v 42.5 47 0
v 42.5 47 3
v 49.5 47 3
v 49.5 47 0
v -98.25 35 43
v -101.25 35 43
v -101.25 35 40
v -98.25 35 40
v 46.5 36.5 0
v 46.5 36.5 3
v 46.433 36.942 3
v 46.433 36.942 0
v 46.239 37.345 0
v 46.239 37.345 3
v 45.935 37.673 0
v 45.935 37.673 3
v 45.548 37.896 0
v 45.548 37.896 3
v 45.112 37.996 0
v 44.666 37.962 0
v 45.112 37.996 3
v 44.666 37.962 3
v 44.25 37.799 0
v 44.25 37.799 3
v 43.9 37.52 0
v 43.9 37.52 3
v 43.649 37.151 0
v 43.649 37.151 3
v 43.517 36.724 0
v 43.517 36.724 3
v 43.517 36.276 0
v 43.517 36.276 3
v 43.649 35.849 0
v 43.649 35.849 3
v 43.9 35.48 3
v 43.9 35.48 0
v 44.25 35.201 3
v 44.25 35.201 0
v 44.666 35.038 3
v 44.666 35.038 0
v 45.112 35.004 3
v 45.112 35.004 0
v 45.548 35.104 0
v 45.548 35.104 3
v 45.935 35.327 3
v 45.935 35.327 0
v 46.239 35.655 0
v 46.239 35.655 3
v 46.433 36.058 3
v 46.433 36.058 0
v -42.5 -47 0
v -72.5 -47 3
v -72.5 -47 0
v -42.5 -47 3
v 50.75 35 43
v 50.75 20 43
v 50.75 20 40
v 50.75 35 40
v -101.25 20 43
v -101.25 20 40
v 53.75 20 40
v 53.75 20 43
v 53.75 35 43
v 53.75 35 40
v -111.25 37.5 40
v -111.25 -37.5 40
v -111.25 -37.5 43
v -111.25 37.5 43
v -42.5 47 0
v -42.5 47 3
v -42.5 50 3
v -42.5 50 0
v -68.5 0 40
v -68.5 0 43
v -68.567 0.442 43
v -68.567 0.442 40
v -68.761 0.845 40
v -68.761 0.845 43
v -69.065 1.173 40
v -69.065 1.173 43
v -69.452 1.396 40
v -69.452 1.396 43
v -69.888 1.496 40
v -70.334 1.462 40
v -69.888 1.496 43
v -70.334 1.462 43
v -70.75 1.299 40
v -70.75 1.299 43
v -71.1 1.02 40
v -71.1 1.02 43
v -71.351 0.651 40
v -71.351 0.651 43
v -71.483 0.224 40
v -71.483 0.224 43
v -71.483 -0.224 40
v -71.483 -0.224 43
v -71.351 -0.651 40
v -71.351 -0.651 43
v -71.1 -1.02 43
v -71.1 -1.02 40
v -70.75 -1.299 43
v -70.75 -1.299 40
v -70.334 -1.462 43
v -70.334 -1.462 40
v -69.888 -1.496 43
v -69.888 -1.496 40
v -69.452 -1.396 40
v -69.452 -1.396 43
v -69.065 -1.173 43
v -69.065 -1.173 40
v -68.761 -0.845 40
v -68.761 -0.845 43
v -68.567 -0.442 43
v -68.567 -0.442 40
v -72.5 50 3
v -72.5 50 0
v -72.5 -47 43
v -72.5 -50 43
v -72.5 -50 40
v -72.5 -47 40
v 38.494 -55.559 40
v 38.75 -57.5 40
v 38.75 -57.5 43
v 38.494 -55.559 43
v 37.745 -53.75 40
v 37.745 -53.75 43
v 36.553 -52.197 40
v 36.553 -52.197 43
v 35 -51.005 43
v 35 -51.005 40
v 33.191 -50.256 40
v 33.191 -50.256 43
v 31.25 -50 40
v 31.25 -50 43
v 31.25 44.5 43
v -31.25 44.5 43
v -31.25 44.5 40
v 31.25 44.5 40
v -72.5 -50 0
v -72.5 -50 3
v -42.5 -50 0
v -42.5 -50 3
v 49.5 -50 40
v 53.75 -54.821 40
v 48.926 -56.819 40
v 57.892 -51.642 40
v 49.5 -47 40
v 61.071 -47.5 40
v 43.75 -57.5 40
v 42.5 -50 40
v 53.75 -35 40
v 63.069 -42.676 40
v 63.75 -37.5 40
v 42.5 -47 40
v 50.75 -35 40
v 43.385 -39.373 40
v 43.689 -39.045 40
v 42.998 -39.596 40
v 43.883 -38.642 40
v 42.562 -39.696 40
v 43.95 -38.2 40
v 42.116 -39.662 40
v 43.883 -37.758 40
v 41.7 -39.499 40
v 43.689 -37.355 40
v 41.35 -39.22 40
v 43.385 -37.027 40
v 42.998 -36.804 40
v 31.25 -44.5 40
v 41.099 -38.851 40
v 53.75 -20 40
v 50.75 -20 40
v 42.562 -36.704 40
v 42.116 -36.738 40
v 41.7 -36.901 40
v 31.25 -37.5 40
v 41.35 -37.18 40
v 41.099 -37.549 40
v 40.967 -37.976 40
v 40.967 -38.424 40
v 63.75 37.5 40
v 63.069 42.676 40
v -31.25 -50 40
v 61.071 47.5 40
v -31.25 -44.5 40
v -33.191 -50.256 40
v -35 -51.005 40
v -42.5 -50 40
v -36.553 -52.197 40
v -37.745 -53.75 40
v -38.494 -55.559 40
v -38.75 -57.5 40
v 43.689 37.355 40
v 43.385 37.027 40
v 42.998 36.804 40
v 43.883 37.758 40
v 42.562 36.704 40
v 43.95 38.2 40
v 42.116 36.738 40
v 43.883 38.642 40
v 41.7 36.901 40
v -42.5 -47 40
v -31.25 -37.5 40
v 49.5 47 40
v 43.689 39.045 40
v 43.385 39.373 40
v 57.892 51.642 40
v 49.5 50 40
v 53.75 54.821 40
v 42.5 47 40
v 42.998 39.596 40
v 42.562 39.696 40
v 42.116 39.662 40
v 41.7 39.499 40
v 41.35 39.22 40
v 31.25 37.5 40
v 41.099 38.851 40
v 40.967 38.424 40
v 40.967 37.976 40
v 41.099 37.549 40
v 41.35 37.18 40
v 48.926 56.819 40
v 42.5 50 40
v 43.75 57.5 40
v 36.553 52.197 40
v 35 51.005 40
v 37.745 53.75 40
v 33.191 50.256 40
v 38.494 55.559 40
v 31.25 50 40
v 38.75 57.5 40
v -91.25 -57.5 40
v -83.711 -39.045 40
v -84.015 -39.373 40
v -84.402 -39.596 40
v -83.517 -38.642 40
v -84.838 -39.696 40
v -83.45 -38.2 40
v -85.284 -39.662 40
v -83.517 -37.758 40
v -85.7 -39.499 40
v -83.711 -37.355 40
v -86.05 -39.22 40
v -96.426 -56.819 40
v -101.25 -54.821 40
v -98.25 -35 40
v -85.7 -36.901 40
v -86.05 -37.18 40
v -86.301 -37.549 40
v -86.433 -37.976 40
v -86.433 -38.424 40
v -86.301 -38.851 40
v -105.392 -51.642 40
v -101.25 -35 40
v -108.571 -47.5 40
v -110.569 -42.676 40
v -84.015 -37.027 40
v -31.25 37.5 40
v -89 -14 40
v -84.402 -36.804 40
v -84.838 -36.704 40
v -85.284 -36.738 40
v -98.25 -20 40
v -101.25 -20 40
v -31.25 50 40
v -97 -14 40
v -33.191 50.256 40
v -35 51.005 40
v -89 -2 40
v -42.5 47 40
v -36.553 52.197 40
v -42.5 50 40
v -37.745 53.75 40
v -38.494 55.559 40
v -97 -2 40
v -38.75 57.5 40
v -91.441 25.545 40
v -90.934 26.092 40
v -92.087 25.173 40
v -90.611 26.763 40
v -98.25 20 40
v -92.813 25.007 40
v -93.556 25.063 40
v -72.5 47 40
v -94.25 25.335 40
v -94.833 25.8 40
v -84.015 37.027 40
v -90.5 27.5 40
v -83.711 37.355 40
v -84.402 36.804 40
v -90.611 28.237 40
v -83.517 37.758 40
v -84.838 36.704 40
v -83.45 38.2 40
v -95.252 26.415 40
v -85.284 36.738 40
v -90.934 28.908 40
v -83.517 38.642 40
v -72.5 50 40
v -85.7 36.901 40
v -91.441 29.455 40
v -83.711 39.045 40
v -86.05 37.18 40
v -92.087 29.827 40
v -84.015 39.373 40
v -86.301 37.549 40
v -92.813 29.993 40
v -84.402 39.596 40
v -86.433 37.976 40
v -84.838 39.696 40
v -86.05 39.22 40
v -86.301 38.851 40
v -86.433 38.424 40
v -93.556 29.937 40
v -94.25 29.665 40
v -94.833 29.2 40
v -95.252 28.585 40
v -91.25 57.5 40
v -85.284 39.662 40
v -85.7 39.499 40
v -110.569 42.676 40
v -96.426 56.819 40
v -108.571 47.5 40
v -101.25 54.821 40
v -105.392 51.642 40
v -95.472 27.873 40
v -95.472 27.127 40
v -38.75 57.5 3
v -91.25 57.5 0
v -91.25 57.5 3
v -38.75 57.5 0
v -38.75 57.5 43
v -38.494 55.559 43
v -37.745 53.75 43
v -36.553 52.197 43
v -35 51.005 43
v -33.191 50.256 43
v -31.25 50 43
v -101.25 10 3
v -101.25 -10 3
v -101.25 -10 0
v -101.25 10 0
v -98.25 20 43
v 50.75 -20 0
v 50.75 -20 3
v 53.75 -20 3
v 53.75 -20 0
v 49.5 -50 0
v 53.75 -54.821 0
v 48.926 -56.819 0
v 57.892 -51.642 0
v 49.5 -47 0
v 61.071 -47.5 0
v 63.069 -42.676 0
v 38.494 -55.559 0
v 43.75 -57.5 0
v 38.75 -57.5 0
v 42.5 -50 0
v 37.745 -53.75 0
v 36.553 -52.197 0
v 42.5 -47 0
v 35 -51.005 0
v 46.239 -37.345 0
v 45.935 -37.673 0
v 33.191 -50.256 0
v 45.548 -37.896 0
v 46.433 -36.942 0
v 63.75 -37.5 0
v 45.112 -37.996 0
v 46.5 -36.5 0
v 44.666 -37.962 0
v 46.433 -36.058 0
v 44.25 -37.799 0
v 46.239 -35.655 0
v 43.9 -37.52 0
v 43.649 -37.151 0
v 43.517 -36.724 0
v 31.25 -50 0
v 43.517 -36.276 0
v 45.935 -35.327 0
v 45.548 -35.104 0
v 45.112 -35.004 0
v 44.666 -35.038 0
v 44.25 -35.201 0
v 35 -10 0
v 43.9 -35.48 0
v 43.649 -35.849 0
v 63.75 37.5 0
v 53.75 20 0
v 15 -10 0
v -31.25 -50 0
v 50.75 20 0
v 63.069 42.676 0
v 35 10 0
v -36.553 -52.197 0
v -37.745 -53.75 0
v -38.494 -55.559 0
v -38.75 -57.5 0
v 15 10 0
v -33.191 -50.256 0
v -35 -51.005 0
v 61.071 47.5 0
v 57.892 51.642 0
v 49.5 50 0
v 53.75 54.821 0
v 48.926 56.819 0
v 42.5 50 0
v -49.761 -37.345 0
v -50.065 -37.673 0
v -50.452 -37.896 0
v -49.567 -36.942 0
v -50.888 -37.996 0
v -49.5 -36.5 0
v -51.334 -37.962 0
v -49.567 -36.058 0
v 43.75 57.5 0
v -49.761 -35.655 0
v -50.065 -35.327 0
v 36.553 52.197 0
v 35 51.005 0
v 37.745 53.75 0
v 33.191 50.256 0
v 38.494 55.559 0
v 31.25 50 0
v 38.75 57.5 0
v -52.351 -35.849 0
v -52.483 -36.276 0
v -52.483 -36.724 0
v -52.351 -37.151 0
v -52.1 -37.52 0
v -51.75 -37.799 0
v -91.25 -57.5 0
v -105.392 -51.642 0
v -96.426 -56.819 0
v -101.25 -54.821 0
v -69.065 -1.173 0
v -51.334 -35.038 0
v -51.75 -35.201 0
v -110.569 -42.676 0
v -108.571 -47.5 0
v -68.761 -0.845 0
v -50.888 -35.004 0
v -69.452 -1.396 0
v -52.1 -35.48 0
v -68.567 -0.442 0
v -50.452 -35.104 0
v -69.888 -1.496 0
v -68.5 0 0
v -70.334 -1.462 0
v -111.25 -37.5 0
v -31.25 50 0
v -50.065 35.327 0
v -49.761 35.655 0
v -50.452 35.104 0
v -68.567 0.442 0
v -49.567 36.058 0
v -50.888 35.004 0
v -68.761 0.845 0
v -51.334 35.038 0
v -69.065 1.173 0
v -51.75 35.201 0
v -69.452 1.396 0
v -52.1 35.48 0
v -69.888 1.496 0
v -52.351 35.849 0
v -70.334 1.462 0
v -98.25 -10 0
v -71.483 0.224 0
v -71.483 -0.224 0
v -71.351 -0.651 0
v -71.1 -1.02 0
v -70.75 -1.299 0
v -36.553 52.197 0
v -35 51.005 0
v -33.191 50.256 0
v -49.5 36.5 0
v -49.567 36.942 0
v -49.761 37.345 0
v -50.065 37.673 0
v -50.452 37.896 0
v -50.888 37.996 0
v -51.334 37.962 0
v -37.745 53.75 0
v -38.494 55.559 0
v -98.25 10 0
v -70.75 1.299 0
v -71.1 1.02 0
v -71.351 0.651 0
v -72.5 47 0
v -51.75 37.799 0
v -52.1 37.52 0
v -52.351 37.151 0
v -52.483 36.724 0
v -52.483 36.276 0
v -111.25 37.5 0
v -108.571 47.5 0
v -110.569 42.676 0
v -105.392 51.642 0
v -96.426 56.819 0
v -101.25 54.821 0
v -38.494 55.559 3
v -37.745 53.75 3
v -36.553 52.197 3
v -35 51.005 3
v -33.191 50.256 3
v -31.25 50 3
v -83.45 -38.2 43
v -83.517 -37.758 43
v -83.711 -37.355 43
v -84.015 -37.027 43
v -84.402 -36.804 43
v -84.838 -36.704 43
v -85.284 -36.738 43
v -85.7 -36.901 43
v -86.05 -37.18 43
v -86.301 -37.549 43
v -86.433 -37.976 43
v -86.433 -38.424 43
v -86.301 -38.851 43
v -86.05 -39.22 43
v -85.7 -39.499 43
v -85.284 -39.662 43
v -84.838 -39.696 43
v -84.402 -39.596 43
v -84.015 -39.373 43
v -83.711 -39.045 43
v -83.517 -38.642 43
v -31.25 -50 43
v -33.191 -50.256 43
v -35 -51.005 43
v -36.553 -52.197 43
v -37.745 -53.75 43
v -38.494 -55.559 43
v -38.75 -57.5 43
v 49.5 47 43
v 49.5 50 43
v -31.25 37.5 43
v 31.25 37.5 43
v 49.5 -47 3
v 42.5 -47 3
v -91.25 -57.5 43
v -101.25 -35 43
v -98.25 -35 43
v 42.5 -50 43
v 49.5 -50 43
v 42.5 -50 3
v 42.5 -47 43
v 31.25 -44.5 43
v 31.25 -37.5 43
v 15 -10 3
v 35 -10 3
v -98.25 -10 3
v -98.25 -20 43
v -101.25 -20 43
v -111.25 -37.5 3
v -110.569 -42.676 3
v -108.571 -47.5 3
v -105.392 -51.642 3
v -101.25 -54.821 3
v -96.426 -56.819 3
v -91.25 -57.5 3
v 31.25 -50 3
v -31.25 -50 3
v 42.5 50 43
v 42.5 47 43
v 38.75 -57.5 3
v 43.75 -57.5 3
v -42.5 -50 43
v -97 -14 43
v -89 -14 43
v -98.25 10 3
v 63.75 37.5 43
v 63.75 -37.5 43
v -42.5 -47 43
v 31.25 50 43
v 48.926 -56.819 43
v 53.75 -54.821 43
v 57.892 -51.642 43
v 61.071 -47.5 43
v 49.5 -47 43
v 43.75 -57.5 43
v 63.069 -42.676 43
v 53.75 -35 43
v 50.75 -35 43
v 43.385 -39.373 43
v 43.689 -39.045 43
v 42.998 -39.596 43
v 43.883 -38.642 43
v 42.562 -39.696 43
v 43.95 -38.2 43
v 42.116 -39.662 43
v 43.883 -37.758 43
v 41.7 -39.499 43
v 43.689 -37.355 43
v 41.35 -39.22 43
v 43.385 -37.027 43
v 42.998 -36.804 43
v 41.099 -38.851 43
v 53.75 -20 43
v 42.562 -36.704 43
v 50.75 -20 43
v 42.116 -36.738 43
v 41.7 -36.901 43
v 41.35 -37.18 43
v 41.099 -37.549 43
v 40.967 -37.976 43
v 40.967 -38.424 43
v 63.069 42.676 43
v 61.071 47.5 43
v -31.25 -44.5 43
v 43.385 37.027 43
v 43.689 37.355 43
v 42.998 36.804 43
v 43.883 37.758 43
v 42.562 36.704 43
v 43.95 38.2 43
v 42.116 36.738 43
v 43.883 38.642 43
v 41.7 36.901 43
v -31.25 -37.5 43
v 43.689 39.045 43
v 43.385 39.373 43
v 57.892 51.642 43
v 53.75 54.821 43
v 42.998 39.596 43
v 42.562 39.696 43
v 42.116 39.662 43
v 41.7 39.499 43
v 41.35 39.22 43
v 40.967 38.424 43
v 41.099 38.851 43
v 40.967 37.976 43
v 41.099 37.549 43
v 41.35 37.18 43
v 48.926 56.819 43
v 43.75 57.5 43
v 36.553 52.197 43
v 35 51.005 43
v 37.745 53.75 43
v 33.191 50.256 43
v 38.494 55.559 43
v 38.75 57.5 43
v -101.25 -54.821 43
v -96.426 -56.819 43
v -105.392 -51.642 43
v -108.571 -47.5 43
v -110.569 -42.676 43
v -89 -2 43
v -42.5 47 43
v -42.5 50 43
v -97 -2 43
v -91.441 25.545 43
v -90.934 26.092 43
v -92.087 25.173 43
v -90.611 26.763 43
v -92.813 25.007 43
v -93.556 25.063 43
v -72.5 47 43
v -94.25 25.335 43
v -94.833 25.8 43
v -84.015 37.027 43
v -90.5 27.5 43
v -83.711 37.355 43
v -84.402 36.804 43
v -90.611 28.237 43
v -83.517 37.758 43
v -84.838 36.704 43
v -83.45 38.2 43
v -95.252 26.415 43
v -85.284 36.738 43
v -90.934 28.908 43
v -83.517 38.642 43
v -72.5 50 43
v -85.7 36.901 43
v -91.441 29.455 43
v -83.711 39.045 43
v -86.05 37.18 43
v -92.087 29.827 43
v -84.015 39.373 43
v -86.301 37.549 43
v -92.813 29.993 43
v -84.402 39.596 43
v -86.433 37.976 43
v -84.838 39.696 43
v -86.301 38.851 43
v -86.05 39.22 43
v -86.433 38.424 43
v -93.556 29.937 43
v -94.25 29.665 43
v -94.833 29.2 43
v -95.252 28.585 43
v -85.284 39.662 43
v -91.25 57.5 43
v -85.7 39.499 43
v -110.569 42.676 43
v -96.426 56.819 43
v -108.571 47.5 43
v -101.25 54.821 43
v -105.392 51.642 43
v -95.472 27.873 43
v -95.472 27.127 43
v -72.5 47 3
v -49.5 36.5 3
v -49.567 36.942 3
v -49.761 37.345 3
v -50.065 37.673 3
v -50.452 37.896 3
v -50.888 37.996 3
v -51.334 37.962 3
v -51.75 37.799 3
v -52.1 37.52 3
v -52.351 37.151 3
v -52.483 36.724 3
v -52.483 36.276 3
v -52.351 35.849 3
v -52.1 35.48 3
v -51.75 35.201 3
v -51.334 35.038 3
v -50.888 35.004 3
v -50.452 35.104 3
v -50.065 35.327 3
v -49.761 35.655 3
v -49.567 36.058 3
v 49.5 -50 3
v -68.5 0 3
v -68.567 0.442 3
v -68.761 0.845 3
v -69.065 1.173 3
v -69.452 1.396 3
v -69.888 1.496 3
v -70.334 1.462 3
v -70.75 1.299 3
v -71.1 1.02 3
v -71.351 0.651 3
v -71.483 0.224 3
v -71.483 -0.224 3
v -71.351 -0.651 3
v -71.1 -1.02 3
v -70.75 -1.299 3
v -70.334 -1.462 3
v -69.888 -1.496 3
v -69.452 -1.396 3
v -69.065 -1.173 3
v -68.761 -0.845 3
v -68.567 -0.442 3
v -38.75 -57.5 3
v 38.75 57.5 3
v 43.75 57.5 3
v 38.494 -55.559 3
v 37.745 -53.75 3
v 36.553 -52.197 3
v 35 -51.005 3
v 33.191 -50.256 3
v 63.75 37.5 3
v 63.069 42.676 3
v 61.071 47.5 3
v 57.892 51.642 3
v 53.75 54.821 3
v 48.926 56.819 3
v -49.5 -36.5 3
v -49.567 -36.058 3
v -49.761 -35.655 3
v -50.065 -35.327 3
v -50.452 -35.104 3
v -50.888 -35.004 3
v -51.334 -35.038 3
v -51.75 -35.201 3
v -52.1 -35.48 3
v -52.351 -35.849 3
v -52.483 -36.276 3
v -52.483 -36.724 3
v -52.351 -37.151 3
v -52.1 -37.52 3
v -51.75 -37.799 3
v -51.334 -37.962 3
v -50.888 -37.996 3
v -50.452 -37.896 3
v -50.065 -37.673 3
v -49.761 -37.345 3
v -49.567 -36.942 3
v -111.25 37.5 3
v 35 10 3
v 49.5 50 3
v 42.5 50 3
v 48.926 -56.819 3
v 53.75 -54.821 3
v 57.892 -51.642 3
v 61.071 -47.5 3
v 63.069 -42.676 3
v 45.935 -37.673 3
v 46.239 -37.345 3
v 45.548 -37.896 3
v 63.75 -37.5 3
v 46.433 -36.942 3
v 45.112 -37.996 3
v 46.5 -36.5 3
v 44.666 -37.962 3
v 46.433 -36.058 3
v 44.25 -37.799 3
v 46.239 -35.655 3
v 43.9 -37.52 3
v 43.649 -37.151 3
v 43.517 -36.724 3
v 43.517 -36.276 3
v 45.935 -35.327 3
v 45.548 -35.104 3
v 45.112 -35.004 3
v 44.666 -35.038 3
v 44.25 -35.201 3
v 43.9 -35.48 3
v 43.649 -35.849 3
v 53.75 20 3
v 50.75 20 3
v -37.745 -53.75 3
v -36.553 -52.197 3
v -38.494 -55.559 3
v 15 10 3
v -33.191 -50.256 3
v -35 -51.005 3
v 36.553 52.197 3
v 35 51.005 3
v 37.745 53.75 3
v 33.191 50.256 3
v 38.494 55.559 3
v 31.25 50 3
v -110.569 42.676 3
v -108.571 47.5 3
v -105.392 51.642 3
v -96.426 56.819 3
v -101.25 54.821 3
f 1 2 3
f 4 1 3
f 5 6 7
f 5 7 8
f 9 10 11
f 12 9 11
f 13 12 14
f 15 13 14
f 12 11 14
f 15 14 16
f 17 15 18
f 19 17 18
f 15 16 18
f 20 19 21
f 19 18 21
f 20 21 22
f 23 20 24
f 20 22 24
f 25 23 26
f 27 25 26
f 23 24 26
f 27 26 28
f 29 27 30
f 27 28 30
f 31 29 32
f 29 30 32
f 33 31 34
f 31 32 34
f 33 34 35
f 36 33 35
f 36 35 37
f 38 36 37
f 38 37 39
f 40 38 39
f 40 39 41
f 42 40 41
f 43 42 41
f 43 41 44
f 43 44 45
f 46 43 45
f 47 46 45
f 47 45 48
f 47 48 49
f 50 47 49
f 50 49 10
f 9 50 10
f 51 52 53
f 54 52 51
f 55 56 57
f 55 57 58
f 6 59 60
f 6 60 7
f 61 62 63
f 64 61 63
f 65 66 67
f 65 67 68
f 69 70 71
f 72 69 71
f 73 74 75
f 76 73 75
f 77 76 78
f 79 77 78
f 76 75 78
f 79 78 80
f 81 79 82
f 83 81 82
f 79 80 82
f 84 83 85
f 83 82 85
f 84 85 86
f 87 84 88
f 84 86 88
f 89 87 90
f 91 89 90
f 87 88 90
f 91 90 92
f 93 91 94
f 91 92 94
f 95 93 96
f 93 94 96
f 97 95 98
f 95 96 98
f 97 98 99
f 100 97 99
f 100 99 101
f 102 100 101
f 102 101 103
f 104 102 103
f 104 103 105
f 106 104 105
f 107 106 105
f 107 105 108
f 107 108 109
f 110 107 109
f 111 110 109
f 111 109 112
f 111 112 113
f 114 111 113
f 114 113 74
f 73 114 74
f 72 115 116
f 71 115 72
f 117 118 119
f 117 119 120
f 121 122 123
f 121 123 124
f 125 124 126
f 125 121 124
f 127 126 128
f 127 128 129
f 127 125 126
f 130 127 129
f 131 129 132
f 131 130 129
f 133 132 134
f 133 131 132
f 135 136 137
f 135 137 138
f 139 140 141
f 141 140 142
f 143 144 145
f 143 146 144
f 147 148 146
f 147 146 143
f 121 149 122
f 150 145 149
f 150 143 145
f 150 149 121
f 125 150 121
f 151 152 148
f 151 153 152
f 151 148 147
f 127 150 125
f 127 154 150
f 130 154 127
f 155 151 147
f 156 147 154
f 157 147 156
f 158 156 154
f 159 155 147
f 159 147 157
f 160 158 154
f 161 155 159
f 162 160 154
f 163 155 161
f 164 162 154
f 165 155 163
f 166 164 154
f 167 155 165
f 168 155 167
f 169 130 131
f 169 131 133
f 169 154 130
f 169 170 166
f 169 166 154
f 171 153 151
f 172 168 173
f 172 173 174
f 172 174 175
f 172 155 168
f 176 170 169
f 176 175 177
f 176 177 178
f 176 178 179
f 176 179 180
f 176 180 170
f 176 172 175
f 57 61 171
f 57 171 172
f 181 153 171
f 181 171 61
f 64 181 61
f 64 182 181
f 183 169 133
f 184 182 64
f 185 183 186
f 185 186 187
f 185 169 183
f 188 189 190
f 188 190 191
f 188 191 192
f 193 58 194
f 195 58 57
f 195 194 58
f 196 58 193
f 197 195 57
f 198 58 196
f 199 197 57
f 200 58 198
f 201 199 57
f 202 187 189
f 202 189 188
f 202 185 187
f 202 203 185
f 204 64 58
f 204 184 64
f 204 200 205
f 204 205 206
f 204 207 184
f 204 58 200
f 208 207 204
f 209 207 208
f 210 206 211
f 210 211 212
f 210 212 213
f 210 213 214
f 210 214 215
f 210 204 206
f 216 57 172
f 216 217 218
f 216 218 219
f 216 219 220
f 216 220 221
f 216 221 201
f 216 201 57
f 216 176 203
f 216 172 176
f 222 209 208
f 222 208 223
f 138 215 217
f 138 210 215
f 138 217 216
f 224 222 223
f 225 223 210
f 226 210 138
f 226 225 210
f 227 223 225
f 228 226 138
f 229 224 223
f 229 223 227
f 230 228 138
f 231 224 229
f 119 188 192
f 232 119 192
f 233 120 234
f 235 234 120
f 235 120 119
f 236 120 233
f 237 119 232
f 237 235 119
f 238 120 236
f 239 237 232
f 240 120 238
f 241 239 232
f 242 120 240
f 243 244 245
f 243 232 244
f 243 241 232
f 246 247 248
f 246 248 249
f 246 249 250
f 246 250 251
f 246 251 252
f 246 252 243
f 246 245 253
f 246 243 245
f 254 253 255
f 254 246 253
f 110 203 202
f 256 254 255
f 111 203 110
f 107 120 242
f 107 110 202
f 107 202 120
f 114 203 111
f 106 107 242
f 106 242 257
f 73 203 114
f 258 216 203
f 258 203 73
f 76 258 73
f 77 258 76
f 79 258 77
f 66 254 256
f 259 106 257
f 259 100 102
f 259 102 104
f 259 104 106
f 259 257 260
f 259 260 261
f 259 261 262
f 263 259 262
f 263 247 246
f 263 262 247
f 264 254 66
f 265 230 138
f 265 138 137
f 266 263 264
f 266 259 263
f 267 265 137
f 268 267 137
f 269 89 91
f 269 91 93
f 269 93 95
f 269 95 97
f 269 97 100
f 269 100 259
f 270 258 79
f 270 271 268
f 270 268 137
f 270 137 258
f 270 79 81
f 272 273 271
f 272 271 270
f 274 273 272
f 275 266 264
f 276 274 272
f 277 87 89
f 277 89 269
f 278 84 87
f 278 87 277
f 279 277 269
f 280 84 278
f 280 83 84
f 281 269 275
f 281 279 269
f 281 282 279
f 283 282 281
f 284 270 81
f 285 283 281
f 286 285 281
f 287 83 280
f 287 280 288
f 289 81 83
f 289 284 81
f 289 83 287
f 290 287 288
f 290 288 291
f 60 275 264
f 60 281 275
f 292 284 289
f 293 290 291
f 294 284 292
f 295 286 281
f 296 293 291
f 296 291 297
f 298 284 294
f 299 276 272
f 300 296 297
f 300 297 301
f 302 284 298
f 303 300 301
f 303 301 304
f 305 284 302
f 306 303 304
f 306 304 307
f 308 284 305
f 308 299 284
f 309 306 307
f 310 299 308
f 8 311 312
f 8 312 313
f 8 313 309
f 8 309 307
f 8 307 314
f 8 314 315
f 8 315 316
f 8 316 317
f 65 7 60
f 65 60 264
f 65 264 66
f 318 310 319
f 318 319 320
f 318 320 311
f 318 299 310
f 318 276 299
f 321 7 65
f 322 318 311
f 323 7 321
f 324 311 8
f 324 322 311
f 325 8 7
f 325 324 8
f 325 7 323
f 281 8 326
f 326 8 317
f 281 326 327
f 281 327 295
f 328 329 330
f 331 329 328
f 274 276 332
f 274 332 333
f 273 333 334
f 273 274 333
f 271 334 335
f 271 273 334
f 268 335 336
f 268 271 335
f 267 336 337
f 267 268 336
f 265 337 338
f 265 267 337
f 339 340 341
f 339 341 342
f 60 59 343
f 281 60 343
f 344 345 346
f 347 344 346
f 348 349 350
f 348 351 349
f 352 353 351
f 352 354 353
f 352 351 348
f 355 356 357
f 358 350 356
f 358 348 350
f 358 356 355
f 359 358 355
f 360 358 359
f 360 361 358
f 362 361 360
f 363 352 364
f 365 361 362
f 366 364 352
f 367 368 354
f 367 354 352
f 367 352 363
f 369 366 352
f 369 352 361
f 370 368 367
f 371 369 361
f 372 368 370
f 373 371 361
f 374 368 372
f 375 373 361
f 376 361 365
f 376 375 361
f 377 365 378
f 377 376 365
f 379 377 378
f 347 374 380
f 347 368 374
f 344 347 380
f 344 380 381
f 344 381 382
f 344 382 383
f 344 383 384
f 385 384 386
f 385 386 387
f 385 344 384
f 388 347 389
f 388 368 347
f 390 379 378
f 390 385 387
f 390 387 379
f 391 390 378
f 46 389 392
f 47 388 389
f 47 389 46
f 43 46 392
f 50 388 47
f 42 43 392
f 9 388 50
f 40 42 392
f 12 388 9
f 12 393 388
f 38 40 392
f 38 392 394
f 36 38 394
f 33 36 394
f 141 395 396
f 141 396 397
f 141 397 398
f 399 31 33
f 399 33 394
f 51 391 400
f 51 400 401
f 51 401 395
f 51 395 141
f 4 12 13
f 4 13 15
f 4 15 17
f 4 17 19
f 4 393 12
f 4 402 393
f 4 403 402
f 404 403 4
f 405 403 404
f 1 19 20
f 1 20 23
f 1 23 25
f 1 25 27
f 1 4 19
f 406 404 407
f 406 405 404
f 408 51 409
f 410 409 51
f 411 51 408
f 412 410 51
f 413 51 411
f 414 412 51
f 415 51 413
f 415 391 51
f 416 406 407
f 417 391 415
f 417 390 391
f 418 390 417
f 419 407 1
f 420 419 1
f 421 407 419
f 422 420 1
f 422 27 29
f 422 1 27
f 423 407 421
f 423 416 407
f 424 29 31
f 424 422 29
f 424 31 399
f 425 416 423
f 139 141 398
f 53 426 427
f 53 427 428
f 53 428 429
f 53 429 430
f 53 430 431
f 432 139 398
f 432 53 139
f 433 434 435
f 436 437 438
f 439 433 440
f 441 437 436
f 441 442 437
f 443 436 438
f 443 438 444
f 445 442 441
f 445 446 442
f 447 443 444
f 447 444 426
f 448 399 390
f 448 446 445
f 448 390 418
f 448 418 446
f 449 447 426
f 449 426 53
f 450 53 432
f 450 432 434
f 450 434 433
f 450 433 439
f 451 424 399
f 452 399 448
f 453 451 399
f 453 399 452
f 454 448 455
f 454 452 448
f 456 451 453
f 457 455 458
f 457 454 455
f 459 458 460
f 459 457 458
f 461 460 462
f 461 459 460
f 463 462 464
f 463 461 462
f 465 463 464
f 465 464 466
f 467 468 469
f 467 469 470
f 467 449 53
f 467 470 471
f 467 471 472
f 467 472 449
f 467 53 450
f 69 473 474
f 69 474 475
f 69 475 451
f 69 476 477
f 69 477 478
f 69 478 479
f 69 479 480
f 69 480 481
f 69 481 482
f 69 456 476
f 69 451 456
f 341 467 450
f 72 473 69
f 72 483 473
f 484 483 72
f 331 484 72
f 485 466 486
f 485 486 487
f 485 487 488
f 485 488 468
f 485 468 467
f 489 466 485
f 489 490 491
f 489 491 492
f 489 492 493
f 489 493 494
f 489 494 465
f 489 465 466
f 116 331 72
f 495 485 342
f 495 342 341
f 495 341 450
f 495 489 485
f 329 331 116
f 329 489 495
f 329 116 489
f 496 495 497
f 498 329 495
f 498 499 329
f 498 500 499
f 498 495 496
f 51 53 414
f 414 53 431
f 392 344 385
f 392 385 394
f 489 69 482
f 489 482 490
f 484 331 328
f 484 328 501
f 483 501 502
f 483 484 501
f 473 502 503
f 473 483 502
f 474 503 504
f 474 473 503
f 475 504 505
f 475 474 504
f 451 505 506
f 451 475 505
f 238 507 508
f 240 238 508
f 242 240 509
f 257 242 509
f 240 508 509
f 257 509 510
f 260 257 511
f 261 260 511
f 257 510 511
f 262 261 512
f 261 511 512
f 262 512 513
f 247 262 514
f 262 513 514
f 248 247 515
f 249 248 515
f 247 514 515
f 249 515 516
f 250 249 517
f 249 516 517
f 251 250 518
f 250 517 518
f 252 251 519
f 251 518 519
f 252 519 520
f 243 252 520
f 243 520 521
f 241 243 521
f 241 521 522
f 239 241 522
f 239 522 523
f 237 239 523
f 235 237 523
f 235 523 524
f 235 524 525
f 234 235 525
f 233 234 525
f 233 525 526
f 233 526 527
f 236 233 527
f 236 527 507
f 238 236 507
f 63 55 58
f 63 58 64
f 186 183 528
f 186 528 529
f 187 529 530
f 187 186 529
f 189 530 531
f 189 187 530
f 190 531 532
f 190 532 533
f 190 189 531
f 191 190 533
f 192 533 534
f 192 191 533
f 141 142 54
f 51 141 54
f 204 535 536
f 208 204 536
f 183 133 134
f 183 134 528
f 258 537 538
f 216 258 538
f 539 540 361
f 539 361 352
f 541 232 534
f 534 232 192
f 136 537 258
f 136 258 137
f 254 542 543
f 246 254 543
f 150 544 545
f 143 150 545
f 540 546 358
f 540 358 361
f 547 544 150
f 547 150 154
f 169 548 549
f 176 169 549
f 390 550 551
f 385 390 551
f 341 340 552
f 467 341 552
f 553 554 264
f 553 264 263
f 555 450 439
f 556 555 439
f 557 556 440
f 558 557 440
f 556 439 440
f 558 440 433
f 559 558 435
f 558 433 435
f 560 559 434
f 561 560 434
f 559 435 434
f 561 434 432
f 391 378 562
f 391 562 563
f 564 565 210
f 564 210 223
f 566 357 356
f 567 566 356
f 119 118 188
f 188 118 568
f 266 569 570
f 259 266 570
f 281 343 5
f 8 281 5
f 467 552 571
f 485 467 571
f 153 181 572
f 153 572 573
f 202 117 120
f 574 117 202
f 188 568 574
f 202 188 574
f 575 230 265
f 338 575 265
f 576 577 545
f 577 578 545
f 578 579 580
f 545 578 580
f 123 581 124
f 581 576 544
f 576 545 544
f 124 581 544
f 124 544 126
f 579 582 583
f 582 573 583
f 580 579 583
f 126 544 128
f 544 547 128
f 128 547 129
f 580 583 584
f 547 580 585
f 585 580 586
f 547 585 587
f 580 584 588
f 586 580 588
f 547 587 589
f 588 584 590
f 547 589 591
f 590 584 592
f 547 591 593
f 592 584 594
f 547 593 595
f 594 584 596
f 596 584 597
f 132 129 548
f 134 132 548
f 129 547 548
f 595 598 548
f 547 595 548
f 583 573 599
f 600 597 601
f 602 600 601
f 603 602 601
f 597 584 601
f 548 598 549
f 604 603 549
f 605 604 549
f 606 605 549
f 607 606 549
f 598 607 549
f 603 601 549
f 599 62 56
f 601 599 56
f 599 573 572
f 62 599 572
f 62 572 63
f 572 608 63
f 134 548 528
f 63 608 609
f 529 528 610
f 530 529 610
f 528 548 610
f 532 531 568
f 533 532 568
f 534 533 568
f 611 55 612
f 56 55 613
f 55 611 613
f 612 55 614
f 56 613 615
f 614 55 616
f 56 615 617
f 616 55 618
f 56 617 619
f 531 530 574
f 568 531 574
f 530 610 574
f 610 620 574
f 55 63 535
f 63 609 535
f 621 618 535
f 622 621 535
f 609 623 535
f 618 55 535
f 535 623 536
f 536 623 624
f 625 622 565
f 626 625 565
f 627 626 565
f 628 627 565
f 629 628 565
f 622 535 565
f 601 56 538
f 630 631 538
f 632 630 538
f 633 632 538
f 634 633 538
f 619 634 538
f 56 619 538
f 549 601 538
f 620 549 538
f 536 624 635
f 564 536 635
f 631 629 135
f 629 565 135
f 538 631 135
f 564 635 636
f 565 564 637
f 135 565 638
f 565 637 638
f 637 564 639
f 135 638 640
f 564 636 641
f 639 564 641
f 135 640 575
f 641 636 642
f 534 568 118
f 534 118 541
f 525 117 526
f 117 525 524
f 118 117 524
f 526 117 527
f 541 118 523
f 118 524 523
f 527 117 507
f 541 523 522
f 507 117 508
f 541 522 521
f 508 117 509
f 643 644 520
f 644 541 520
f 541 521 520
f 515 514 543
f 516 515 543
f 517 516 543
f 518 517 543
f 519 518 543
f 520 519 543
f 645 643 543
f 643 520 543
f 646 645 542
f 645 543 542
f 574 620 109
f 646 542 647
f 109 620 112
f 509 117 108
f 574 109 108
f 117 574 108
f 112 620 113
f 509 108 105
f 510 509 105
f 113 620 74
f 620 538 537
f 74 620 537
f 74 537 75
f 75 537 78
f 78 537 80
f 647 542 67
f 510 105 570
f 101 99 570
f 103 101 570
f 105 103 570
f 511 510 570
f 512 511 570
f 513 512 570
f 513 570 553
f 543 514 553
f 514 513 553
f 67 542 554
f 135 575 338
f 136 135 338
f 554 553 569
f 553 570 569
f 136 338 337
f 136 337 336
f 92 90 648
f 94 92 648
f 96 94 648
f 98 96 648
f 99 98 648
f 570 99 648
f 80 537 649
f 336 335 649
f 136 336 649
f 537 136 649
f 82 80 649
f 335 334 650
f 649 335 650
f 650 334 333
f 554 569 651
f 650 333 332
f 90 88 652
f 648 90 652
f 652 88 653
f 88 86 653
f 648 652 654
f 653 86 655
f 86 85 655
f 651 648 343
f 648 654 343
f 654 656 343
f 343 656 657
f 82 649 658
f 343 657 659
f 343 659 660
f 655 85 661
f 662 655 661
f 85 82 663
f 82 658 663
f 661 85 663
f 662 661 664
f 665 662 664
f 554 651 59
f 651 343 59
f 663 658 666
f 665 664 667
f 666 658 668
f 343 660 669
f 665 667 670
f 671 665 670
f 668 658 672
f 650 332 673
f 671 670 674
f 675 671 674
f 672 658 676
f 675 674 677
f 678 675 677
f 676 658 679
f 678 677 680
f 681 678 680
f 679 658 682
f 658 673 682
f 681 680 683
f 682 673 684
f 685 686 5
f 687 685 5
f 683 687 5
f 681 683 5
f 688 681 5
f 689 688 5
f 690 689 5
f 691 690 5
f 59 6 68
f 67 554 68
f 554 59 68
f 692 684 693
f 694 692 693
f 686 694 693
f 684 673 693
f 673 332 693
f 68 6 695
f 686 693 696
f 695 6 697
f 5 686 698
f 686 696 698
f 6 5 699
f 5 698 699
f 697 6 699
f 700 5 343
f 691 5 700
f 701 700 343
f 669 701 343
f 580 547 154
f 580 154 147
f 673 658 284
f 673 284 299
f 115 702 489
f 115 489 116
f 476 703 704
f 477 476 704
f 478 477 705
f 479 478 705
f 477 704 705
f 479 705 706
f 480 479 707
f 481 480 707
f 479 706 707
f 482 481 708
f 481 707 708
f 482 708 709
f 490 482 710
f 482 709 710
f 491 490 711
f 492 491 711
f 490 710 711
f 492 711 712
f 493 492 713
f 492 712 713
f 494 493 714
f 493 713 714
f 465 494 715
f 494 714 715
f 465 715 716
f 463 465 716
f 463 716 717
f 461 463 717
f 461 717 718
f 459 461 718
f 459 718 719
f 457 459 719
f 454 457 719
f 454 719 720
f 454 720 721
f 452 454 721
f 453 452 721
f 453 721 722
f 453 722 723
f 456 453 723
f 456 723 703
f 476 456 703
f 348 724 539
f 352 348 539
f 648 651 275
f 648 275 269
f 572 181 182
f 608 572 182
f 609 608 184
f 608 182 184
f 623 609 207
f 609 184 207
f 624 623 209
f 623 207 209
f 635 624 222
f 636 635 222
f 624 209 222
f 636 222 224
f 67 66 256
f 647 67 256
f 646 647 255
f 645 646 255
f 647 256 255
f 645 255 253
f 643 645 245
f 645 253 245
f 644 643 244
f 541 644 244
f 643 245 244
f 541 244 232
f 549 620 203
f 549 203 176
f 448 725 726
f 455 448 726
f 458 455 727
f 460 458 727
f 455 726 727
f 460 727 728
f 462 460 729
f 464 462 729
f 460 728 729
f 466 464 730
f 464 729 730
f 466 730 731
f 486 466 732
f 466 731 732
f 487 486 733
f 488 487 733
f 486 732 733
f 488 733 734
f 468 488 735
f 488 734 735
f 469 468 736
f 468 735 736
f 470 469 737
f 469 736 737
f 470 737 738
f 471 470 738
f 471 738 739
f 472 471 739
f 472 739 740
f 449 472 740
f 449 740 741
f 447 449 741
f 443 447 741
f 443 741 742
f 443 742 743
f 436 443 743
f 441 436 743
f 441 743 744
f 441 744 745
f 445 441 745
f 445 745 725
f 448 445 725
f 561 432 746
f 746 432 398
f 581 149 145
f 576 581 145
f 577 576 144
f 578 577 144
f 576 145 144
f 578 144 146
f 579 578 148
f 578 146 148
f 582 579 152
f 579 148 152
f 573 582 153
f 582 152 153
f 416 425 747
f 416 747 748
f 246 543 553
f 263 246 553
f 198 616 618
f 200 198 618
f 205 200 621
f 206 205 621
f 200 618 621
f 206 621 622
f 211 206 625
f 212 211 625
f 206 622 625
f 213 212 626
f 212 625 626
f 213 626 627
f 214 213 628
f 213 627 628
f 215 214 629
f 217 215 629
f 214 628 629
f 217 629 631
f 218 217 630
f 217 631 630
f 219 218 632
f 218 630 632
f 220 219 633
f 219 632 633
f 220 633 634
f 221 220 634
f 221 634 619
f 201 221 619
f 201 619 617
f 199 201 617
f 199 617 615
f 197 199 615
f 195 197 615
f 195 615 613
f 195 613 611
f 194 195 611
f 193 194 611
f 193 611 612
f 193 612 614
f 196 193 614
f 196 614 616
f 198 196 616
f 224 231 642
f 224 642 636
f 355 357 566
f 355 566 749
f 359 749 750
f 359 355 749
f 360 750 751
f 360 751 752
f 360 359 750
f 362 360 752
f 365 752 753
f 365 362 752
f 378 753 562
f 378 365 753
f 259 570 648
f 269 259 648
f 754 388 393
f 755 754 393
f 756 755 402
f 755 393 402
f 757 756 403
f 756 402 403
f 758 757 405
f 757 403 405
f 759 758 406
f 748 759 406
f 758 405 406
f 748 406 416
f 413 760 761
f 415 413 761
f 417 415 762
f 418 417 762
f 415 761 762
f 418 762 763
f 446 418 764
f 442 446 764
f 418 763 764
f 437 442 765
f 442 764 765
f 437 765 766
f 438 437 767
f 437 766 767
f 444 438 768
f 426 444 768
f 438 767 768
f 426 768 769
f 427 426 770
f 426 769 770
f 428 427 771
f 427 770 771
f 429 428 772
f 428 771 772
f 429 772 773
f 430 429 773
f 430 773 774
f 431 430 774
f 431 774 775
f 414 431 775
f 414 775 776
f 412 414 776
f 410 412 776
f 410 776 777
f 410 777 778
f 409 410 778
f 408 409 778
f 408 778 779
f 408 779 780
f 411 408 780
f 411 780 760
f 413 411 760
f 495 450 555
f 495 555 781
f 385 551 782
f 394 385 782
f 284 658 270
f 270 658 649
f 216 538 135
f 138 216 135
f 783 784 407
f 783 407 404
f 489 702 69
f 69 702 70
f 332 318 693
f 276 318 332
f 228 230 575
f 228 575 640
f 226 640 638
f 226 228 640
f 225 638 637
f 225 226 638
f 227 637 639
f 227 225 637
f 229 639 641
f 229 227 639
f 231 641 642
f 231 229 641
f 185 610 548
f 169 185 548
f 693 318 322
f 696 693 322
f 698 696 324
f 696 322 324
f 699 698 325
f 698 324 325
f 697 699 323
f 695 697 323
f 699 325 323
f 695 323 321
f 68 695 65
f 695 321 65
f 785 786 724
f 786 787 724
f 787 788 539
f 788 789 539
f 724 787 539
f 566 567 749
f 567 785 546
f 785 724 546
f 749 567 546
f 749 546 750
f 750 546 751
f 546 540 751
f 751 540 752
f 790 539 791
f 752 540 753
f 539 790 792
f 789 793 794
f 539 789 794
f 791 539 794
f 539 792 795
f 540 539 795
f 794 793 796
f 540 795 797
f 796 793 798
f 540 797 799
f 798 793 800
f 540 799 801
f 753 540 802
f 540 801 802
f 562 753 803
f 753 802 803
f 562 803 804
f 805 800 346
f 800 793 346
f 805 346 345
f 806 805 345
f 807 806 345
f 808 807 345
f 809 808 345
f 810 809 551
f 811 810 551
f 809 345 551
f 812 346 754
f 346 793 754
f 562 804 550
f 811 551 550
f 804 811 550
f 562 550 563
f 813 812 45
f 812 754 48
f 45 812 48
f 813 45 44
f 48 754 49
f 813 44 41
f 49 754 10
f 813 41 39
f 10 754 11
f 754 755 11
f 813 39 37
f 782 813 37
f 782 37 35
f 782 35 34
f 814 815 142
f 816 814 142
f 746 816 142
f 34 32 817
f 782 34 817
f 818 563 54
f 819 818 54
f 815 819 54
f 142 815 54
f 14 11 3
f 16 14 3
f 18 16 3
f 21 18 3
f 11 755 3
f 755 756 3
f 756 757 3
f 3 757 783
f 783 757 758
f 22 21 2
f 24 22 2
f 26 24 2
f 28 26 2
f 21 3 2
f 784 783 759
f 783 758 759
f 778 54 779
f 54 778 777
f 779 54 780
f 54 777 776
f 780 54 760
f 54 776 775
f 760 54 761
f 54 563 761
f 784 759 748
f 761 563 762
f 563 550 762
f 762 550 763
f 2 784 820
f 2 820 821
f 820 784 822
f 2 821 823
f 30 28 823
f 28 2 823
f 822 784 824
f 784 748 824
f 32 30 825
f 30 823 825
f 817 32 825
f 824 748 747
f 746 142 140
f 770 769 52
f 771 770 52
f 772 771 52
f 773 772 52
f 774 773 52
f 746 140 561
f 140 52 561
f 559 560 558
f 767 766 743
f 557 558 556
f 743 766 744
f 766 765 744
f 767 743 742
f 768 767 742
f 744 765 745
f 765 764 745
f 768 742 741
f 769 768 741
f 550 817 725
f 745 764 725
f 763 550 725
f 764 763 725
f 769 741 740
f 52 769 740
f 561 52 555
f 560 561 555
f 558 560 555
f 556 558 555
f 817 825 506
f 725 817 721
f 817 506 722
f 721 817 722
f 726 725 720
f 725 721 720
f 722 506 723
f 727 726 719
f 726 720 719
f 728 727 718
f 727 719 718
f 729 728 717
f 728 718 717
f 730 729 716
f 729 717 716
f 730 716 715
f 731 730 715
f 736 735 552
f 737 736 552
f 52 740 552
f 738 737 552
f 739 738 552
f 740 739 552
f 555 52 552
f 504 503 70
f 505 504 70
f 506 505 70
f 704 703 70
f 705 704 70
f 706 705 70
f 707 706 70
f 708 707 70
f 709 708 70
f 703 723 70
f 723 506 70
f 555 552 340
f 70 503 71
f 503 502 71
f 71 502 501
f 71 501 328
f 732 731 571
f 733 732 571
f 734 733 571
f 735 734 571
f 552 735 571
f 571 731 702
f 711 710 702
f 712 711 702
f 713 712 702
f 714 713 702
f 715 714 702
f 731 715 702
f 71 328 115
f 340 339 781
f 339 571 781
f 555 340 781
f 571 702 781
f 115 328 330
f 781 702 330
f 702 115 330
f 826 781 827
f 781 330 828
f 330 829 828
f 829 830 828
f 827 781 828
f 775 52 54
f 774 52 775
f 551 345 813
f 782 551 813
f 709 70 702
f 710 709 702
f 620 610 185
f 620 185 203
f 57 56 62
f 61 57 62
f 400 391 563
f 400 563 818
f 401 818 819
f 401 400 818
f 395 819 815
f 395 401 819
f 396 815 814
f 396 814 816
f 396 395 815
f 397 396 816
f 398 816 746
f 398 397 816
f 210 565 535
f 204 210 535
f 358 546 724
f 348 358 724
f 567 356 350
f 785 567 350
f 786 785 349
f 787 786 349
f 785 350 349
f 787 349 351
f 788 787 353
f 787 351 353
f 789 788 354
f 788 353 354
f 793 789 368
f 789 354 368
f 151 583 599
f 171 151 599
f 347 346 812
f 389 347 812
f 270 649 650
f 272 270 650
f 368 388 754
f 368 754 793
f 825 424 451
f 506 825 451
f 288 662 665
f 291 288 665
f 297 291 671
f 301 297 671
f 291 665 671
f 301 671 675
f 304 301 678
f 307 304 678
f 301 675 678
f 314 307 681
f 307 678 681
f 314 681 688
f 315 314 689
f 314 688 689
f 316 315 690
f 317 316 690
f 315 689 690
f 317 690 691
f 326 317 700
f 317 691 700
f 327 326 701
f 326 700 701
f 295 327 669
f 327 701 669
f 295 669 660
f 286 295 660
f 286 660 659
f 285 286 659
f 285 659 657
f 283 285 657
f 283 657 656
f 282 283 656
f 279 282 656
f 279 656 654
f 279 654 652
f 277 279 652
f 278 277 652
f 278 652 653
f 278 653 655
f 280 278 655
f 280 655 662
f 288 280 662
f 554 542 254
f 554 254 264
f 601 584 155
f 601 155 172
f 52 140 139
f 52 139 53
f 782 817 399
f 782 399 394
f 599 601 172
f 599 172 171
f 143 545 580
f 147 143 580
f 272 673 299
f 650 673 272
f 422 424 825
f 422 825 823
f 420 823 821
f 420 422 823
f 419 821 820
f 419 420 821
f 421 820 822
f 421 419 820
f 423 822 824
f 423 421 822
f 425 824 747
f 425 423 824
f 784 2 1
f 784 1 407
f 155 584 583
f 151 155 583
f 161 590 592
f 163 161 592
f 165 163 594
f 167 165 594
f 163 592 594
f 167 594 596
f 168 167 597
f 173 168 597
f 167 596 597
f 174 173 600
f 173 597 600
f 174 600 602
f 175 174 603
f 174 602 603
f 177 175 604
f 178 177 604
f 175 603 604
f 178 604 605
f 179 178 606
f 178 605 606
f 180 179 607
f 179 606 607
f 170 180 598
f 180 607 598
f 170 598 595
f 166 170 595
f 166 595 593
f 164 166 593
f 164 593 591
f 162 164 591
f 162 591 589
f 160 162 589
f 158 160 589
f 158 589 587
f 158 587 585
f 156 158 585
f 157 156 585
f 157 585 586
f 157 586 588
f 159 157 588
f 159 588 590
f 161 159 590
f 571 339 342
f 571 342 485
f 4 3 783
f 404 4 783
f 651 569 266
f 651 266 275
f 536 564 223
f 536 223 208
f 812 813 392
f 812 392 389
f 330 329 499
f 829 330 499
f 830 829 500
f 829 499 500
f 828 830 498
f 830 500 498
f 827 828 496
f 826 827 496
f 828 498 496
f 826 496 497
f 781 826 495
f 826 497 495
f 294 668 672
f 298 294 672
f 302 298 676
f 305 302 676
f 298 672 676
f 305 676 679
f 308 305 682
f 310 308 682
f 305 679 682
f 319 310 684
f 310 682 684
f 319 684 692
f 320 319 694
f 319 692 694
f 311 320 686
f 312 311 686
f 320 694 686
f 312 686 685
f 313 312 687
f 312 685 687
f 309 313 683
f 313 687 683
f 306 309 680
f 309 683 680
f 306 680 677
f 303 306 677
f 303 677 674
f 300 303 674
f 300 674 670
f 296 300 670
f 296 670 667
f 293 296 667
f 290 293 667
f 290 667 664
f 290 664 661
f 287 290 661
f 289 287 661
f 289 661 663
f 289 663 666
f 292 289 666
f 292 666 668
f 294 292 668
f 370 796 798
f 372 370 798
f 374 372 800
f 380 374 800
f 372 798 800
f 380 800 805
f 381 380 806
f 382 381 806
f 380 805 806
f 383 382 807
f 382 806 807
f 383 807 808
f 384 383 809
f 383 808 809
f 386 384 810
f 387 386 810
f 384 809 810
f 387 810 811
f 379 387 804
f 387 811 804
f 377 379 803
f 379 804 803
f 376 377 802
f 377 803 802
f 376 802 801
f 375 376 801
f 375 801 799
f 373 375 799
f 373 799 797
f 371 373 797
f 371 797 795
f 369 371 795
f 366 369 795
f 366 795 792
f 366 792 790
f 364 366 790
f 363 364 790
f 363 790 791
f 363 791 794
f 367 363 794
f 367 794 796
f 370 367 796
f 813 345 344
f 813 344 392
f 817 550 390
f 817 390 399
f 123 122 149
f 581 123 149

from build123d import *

# Parameters (mm, degrees)
PAD_DEPTH       = 3
SKETCH001_R     = 1.5
POCKET_DEPTH    = 3.001
SKETCH002_W     = 30
SKETCH002_H     = 3
SKETCH002_W_2   = 7
POCKET001_DEPTH = 3.001
SKETCH003_W     = 3
SKETCH003_H     = 20
SKETCH003_H_2   = 40
POCKET002_DEPTH = 3.001
SKETCH004_R     = 1.5
SKETCH004_W     = 20
SKETCH004_H     = 20
POCKET003_DEPTH = 3.001
SKETCH005_W     = 3
SKETCH005_H     = 15
POCKET004_DEPTH = 3.001
SKETCH006_W     = 62.5
SKETCH006_H     = 7
POCKET005_DEPTH = 3.001
SKETCH007_R     = 1.5
POCKET006_DEPTH = 3.001
SKETCH008_R     = 2.5
SKETCH008_W     = 8
SKETCH008_H     = 12
POCKET007_DEPTH = 3.001


with BuildPart() as tapainferiorencastrelaterales:
    # Sketch → Pad (new body)
    with BuildSketch(Plane.XY):
        with BuildLine():
            Line((63.749997, 37.5), (63.749997, -37.5))
            ThreePointArc((43.749997, -57.5), (57.892133, -51.642136), (63.749997, -37.5))
            Line((38.749997, -57.5), (43.749997, -57.5))
            ThreePointArc((38.749997, -57.5), (36.553299, -52.1967), (31.25, -50))
            Line((31.25, -50), (-31.25, -49.999975))
            ThreePointArc((-31.25, -49.999975), (-36.553312, -52.196682), (-38.750003, -57.5))
            Line((-91.250003, -57.5), (-38.750003, -57.5))
            ThreePointArc((-111.249998, -37.5), (-105.392135, -51.642134), (-91.250003, -57.5))
            Line((-111.249998, -37.5), (-111.249998, 37.5))
            ThreePointArc((-91.25, 57.5), (-105.392134, 51.642135), (-111.249998, 37.5))
            Line((-91.25, 57.5), (-38.75, 57.5))
            ThreePointArc((-38.75, 57.5), (-36.553301, 52.196699), (-31.25, 50))
            Line((31.25, 50), (-31.25, 50))
            ThreePointArc((31.25, 50), (36.553301, 52.196699), (38.75, 57.5))
            Line((38.75, 57.5), (43.75, 57.5))
            ThreePointArc((63.749997, 37.5), (57.892134, 51.642135), (43.75, 57.5))
        make_face()
    extrude(amount=PAD_DEPTH)

    # Sketch001 → Pocket (cut, through all)
    with BuildSketch(Plane.XY.offset(3)):
        with Locations((-70, 0)):
            Circle(SKETCH001_R)
    extrude(amount=-POCKET_DEPTH, mode=Mode.SUBTRACT)

    # Sketch002 → Pocket001 (cut, through all)
    with BuildSketch(Plane.XY.offset(3)):
        with Locations((-57.5, -48.5)):
            Rectangle(SKETCH002_W, SKETCH002_H)
        with Locations((-57.5, 48.5)):
            Rectangle(SKETCH002_W, SKETCH002_H)
        with Locations((46, 48.5)):
            Rectangle(SKETCH002_W_2, SKETCH002_H)
        with Locations((46, -48.5)):
            Rectangle(SKETCH002_W_2, SKETCH002_H)
    extrude(amount=-POCKET001_DEPTH, mode=Mode.SUBTRACT)


with BuildPart() as tapainferiorhuecospcb:
    # Pocket002 base: copy of TapaInferiorEncastreLaterales
    add(tapainferiorencastrelaterales.part)

    # Sketch003 → Pocket002 (cut, through all)
    with BuildSketch(Plane.XY.offset(3)):
        with Locations((-99.75, 0)):
            Rectangle(SKETCH003_W, SKETCH003_H)
        with Locations((52.25, 0)):
            Rectangle(SKETCH003_W, SKETCH003_H_2)
    extrude(amount=-POCKET002_DEPTH, mode=Mode.SUBTRACT)

    # Sketch004 → Pocket003 (cut, through all)
    with BuildSketch(Plane.XY.offset(3)):
        with Locations((-51, 36.5)):
            Circle(SKETCH004_R)
        with Locations((-51, -36.5)):
            Circle(SKETCH004_R)
        with Locations((45, 36.5)):
            Circle(SKETCH004_R)
        with Locations((45, -36.5)):
            Circle(SKETCH004_R)
        with Locations((25, 0)):
            Rectangle(SKETCH004_W, SKETCH004_H)
    extrude(amount=-POCKET003_DEPTH, mode=Mode.SUBTRACT)


with BuildPart() as tapasuperioreduciaabateria:
    # Clone base: copy of TapaInferiorEncastreLaterales
    add(tapainferiorencastrelaterales.part)


with BuildPart() as tapasuperioreduciaabateria_1:
    # Clone placement: moved
    add(tapasuperioreduciaabateria.part.moved(Location((0, 0, 40))))

    # Sketch005 → Pocket004 (cut, through all)
    with BuildSketch(Plane.XY.offset(43)):
        with Locations((52.25, 27.5)):
            Rectangle(SKETCH005_W, SKETCH005_H)
        with Locations((52.25, -27.5)):
            Rectangle(SKETCH005_W, SKETCH005_H)
        with Locations((-99.75, 27.5)):
            Rectangle(SKETCH005_W, SKETCH005_H)
        with Locations((-99.75, -27.5)):
            Rectangle(SKETCH005_W, SKETCH005_H)
    extrude(amount=-POCKET004_DEPTH, mode=Mode.SUBTRACT)

    # Sketch006 → Pocket005 (cut, through all)
    with BuildSketch(Plane.XY.offset(43)):
        with Locations((0, 41)):
            Rectangle(SKETCH006_W, SKETCH006_H)
        with Locations((0, -41)):
            Rectangle(SKETCH006_W, SKETCH006_H)
    extrude(amount=-POCKET005_DEPTH, mode=Mode.SUBTRACT)

    # Sketch007 → Pocket006 (cut, through all)
    with BuildSketch(Plane.XY.offset(43)):
        with Locations((-84.95, 38.2)):
            Circle(SKETCH007_R)
        with Locations((-84.95, -38.2)):
            Circle(SKETCH007_R)
        with Locations((42.45, 38.2)):
            Circle(SKETCH007_R)
        with Locations((42.45, -38.2)):
            Circle(SKETCH007_R)
    extrude(amount=-POCKET006_DEPTH, mode=Mode.SUBTRACT)

    # Sketch008 → Pocket007 (cut, through all)
    with BuildSketch(Plane.XY.offset(43)):
        with Locations((-93, 27.5)):
            Circle(SKETCH008_R)
        with Locations((-93, -8)):
            Rectangle(SKETCH008_W, SKETCH008_H)
    extrude(amount=-POCKET007_DEPTH, mode=Mode.SUBTRACT)


solid = Compound([tapainferiorhuecospcb.part, tapasuperioreduciaabateria_1.part])
